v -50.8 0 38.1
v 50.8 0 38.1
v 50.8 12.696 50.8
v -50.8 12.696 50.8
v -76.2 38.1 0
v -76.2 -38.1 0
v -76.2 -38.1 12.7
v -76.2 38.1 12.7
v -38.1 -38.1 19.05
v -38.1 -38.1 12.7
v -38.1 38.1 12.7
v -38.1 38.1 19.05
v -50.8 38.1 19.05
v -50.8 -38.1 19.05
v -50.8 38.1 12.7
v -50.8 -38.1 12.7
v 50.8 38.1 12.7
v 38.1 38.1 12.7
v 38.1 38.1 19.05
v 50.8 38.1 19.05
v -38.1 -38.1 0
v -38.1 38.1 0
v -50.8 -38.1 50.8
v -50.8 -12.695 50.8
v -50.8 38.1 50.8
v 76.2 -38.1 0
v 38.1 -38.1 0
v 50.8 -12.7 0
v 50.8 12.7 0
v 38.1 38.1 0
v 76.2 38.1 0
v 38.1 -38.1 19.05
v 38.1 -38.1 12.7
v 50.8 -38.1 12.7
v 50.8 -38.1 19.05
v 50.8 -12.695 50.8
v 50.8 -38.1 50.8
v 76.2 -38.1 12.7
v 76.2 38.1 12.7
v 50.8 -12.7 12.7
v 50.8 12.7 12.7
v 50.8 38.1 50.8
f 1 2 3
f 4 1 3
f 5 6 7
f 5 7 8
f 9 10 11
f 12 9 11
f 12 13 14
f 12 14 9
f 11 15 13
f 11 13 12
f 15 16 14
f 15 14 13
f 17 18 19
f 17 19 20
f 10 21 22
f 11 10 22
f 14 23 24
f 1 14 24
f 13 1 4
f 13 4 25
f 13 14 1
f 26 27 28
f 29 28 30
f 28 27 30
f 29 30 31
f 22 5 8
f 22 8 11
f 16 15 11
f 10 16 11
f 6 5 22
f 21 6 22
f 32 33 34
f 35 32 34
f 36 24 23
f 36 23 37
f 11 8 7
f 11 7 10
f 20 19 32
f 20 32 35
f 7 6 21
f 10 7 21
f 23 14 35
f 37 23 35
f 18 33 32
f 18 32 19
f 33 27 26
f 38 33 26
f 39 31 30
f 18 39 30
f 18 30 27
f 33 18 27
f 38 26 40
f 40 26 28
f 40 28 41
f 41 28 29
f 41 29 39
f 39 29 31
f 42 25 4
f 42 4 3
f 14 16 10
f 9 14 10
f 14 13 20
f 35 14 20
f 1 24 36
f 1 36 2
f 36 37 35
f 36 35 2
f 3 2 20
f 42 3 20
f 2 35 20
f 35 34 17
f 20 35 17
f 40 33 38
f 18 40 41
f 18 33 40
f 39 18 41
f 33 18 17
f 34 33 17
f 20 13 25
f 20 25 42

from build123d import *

# Parameters (mm, degrees)
F0_W     = 38.1
F0_H     = 76.2
F1_DEPTH = 12.7
F2_W     = 12.7
F2_H     = 76.2
F3_DEPTH = 6.35
F4_W     = 101.6
F4_H     = 76.2
F5_DEPTH = 31.75
F7_DEPTH = 127.001


with BuildPart() as f1:
    # F0 (on Top) → F1 (new body)
    with BuildSketch(Plane.XY):
        Polygon((76.2, 38.1), (38.1, 38.1), (38.1, -38.1), (76.2, -38.1), (50.8, -12.7), (50.8, 12.7), align=None)
        with Locations((-57.15, 0)):
            Rectangle(F0_W, F0_H)
    extrude(amount=F1_DEPTH)


with BuildPart() as f3:
    # F2 (on face) → F3 (new body)
    with BuildSketch(Plane.XY.offset(12.7)):
        with Locations((44.45, 0)):
            Rectangle(F2_W, F2_H)
        with Locations((-44.45, 0)):
            Rectangle(F2_W, F2_H)
    extrude(amount=F3_DEPTH)


with BuildPart() as f5:
    # F4 (on face) → F5 (new body)
    with BuildSketch(Plane.XY.offset(19.05)):
        Rectangle(F4_W, F4_H)
    extrude(amount=F5_DEPTH)

    # F6 (on face) → F7 (cut, through all)
    with BuildSketch(Plane.YZ.offset(50.8)):
        Polygon((-12.694698, 50.8), (0, 38.1), (12.696164, 50.8), align=None)
    extrude(amount=-F7_DEPTH, mode=Mode.SUBTRACT)


solid = Compound([f1.part, f3.part, f5.part])
